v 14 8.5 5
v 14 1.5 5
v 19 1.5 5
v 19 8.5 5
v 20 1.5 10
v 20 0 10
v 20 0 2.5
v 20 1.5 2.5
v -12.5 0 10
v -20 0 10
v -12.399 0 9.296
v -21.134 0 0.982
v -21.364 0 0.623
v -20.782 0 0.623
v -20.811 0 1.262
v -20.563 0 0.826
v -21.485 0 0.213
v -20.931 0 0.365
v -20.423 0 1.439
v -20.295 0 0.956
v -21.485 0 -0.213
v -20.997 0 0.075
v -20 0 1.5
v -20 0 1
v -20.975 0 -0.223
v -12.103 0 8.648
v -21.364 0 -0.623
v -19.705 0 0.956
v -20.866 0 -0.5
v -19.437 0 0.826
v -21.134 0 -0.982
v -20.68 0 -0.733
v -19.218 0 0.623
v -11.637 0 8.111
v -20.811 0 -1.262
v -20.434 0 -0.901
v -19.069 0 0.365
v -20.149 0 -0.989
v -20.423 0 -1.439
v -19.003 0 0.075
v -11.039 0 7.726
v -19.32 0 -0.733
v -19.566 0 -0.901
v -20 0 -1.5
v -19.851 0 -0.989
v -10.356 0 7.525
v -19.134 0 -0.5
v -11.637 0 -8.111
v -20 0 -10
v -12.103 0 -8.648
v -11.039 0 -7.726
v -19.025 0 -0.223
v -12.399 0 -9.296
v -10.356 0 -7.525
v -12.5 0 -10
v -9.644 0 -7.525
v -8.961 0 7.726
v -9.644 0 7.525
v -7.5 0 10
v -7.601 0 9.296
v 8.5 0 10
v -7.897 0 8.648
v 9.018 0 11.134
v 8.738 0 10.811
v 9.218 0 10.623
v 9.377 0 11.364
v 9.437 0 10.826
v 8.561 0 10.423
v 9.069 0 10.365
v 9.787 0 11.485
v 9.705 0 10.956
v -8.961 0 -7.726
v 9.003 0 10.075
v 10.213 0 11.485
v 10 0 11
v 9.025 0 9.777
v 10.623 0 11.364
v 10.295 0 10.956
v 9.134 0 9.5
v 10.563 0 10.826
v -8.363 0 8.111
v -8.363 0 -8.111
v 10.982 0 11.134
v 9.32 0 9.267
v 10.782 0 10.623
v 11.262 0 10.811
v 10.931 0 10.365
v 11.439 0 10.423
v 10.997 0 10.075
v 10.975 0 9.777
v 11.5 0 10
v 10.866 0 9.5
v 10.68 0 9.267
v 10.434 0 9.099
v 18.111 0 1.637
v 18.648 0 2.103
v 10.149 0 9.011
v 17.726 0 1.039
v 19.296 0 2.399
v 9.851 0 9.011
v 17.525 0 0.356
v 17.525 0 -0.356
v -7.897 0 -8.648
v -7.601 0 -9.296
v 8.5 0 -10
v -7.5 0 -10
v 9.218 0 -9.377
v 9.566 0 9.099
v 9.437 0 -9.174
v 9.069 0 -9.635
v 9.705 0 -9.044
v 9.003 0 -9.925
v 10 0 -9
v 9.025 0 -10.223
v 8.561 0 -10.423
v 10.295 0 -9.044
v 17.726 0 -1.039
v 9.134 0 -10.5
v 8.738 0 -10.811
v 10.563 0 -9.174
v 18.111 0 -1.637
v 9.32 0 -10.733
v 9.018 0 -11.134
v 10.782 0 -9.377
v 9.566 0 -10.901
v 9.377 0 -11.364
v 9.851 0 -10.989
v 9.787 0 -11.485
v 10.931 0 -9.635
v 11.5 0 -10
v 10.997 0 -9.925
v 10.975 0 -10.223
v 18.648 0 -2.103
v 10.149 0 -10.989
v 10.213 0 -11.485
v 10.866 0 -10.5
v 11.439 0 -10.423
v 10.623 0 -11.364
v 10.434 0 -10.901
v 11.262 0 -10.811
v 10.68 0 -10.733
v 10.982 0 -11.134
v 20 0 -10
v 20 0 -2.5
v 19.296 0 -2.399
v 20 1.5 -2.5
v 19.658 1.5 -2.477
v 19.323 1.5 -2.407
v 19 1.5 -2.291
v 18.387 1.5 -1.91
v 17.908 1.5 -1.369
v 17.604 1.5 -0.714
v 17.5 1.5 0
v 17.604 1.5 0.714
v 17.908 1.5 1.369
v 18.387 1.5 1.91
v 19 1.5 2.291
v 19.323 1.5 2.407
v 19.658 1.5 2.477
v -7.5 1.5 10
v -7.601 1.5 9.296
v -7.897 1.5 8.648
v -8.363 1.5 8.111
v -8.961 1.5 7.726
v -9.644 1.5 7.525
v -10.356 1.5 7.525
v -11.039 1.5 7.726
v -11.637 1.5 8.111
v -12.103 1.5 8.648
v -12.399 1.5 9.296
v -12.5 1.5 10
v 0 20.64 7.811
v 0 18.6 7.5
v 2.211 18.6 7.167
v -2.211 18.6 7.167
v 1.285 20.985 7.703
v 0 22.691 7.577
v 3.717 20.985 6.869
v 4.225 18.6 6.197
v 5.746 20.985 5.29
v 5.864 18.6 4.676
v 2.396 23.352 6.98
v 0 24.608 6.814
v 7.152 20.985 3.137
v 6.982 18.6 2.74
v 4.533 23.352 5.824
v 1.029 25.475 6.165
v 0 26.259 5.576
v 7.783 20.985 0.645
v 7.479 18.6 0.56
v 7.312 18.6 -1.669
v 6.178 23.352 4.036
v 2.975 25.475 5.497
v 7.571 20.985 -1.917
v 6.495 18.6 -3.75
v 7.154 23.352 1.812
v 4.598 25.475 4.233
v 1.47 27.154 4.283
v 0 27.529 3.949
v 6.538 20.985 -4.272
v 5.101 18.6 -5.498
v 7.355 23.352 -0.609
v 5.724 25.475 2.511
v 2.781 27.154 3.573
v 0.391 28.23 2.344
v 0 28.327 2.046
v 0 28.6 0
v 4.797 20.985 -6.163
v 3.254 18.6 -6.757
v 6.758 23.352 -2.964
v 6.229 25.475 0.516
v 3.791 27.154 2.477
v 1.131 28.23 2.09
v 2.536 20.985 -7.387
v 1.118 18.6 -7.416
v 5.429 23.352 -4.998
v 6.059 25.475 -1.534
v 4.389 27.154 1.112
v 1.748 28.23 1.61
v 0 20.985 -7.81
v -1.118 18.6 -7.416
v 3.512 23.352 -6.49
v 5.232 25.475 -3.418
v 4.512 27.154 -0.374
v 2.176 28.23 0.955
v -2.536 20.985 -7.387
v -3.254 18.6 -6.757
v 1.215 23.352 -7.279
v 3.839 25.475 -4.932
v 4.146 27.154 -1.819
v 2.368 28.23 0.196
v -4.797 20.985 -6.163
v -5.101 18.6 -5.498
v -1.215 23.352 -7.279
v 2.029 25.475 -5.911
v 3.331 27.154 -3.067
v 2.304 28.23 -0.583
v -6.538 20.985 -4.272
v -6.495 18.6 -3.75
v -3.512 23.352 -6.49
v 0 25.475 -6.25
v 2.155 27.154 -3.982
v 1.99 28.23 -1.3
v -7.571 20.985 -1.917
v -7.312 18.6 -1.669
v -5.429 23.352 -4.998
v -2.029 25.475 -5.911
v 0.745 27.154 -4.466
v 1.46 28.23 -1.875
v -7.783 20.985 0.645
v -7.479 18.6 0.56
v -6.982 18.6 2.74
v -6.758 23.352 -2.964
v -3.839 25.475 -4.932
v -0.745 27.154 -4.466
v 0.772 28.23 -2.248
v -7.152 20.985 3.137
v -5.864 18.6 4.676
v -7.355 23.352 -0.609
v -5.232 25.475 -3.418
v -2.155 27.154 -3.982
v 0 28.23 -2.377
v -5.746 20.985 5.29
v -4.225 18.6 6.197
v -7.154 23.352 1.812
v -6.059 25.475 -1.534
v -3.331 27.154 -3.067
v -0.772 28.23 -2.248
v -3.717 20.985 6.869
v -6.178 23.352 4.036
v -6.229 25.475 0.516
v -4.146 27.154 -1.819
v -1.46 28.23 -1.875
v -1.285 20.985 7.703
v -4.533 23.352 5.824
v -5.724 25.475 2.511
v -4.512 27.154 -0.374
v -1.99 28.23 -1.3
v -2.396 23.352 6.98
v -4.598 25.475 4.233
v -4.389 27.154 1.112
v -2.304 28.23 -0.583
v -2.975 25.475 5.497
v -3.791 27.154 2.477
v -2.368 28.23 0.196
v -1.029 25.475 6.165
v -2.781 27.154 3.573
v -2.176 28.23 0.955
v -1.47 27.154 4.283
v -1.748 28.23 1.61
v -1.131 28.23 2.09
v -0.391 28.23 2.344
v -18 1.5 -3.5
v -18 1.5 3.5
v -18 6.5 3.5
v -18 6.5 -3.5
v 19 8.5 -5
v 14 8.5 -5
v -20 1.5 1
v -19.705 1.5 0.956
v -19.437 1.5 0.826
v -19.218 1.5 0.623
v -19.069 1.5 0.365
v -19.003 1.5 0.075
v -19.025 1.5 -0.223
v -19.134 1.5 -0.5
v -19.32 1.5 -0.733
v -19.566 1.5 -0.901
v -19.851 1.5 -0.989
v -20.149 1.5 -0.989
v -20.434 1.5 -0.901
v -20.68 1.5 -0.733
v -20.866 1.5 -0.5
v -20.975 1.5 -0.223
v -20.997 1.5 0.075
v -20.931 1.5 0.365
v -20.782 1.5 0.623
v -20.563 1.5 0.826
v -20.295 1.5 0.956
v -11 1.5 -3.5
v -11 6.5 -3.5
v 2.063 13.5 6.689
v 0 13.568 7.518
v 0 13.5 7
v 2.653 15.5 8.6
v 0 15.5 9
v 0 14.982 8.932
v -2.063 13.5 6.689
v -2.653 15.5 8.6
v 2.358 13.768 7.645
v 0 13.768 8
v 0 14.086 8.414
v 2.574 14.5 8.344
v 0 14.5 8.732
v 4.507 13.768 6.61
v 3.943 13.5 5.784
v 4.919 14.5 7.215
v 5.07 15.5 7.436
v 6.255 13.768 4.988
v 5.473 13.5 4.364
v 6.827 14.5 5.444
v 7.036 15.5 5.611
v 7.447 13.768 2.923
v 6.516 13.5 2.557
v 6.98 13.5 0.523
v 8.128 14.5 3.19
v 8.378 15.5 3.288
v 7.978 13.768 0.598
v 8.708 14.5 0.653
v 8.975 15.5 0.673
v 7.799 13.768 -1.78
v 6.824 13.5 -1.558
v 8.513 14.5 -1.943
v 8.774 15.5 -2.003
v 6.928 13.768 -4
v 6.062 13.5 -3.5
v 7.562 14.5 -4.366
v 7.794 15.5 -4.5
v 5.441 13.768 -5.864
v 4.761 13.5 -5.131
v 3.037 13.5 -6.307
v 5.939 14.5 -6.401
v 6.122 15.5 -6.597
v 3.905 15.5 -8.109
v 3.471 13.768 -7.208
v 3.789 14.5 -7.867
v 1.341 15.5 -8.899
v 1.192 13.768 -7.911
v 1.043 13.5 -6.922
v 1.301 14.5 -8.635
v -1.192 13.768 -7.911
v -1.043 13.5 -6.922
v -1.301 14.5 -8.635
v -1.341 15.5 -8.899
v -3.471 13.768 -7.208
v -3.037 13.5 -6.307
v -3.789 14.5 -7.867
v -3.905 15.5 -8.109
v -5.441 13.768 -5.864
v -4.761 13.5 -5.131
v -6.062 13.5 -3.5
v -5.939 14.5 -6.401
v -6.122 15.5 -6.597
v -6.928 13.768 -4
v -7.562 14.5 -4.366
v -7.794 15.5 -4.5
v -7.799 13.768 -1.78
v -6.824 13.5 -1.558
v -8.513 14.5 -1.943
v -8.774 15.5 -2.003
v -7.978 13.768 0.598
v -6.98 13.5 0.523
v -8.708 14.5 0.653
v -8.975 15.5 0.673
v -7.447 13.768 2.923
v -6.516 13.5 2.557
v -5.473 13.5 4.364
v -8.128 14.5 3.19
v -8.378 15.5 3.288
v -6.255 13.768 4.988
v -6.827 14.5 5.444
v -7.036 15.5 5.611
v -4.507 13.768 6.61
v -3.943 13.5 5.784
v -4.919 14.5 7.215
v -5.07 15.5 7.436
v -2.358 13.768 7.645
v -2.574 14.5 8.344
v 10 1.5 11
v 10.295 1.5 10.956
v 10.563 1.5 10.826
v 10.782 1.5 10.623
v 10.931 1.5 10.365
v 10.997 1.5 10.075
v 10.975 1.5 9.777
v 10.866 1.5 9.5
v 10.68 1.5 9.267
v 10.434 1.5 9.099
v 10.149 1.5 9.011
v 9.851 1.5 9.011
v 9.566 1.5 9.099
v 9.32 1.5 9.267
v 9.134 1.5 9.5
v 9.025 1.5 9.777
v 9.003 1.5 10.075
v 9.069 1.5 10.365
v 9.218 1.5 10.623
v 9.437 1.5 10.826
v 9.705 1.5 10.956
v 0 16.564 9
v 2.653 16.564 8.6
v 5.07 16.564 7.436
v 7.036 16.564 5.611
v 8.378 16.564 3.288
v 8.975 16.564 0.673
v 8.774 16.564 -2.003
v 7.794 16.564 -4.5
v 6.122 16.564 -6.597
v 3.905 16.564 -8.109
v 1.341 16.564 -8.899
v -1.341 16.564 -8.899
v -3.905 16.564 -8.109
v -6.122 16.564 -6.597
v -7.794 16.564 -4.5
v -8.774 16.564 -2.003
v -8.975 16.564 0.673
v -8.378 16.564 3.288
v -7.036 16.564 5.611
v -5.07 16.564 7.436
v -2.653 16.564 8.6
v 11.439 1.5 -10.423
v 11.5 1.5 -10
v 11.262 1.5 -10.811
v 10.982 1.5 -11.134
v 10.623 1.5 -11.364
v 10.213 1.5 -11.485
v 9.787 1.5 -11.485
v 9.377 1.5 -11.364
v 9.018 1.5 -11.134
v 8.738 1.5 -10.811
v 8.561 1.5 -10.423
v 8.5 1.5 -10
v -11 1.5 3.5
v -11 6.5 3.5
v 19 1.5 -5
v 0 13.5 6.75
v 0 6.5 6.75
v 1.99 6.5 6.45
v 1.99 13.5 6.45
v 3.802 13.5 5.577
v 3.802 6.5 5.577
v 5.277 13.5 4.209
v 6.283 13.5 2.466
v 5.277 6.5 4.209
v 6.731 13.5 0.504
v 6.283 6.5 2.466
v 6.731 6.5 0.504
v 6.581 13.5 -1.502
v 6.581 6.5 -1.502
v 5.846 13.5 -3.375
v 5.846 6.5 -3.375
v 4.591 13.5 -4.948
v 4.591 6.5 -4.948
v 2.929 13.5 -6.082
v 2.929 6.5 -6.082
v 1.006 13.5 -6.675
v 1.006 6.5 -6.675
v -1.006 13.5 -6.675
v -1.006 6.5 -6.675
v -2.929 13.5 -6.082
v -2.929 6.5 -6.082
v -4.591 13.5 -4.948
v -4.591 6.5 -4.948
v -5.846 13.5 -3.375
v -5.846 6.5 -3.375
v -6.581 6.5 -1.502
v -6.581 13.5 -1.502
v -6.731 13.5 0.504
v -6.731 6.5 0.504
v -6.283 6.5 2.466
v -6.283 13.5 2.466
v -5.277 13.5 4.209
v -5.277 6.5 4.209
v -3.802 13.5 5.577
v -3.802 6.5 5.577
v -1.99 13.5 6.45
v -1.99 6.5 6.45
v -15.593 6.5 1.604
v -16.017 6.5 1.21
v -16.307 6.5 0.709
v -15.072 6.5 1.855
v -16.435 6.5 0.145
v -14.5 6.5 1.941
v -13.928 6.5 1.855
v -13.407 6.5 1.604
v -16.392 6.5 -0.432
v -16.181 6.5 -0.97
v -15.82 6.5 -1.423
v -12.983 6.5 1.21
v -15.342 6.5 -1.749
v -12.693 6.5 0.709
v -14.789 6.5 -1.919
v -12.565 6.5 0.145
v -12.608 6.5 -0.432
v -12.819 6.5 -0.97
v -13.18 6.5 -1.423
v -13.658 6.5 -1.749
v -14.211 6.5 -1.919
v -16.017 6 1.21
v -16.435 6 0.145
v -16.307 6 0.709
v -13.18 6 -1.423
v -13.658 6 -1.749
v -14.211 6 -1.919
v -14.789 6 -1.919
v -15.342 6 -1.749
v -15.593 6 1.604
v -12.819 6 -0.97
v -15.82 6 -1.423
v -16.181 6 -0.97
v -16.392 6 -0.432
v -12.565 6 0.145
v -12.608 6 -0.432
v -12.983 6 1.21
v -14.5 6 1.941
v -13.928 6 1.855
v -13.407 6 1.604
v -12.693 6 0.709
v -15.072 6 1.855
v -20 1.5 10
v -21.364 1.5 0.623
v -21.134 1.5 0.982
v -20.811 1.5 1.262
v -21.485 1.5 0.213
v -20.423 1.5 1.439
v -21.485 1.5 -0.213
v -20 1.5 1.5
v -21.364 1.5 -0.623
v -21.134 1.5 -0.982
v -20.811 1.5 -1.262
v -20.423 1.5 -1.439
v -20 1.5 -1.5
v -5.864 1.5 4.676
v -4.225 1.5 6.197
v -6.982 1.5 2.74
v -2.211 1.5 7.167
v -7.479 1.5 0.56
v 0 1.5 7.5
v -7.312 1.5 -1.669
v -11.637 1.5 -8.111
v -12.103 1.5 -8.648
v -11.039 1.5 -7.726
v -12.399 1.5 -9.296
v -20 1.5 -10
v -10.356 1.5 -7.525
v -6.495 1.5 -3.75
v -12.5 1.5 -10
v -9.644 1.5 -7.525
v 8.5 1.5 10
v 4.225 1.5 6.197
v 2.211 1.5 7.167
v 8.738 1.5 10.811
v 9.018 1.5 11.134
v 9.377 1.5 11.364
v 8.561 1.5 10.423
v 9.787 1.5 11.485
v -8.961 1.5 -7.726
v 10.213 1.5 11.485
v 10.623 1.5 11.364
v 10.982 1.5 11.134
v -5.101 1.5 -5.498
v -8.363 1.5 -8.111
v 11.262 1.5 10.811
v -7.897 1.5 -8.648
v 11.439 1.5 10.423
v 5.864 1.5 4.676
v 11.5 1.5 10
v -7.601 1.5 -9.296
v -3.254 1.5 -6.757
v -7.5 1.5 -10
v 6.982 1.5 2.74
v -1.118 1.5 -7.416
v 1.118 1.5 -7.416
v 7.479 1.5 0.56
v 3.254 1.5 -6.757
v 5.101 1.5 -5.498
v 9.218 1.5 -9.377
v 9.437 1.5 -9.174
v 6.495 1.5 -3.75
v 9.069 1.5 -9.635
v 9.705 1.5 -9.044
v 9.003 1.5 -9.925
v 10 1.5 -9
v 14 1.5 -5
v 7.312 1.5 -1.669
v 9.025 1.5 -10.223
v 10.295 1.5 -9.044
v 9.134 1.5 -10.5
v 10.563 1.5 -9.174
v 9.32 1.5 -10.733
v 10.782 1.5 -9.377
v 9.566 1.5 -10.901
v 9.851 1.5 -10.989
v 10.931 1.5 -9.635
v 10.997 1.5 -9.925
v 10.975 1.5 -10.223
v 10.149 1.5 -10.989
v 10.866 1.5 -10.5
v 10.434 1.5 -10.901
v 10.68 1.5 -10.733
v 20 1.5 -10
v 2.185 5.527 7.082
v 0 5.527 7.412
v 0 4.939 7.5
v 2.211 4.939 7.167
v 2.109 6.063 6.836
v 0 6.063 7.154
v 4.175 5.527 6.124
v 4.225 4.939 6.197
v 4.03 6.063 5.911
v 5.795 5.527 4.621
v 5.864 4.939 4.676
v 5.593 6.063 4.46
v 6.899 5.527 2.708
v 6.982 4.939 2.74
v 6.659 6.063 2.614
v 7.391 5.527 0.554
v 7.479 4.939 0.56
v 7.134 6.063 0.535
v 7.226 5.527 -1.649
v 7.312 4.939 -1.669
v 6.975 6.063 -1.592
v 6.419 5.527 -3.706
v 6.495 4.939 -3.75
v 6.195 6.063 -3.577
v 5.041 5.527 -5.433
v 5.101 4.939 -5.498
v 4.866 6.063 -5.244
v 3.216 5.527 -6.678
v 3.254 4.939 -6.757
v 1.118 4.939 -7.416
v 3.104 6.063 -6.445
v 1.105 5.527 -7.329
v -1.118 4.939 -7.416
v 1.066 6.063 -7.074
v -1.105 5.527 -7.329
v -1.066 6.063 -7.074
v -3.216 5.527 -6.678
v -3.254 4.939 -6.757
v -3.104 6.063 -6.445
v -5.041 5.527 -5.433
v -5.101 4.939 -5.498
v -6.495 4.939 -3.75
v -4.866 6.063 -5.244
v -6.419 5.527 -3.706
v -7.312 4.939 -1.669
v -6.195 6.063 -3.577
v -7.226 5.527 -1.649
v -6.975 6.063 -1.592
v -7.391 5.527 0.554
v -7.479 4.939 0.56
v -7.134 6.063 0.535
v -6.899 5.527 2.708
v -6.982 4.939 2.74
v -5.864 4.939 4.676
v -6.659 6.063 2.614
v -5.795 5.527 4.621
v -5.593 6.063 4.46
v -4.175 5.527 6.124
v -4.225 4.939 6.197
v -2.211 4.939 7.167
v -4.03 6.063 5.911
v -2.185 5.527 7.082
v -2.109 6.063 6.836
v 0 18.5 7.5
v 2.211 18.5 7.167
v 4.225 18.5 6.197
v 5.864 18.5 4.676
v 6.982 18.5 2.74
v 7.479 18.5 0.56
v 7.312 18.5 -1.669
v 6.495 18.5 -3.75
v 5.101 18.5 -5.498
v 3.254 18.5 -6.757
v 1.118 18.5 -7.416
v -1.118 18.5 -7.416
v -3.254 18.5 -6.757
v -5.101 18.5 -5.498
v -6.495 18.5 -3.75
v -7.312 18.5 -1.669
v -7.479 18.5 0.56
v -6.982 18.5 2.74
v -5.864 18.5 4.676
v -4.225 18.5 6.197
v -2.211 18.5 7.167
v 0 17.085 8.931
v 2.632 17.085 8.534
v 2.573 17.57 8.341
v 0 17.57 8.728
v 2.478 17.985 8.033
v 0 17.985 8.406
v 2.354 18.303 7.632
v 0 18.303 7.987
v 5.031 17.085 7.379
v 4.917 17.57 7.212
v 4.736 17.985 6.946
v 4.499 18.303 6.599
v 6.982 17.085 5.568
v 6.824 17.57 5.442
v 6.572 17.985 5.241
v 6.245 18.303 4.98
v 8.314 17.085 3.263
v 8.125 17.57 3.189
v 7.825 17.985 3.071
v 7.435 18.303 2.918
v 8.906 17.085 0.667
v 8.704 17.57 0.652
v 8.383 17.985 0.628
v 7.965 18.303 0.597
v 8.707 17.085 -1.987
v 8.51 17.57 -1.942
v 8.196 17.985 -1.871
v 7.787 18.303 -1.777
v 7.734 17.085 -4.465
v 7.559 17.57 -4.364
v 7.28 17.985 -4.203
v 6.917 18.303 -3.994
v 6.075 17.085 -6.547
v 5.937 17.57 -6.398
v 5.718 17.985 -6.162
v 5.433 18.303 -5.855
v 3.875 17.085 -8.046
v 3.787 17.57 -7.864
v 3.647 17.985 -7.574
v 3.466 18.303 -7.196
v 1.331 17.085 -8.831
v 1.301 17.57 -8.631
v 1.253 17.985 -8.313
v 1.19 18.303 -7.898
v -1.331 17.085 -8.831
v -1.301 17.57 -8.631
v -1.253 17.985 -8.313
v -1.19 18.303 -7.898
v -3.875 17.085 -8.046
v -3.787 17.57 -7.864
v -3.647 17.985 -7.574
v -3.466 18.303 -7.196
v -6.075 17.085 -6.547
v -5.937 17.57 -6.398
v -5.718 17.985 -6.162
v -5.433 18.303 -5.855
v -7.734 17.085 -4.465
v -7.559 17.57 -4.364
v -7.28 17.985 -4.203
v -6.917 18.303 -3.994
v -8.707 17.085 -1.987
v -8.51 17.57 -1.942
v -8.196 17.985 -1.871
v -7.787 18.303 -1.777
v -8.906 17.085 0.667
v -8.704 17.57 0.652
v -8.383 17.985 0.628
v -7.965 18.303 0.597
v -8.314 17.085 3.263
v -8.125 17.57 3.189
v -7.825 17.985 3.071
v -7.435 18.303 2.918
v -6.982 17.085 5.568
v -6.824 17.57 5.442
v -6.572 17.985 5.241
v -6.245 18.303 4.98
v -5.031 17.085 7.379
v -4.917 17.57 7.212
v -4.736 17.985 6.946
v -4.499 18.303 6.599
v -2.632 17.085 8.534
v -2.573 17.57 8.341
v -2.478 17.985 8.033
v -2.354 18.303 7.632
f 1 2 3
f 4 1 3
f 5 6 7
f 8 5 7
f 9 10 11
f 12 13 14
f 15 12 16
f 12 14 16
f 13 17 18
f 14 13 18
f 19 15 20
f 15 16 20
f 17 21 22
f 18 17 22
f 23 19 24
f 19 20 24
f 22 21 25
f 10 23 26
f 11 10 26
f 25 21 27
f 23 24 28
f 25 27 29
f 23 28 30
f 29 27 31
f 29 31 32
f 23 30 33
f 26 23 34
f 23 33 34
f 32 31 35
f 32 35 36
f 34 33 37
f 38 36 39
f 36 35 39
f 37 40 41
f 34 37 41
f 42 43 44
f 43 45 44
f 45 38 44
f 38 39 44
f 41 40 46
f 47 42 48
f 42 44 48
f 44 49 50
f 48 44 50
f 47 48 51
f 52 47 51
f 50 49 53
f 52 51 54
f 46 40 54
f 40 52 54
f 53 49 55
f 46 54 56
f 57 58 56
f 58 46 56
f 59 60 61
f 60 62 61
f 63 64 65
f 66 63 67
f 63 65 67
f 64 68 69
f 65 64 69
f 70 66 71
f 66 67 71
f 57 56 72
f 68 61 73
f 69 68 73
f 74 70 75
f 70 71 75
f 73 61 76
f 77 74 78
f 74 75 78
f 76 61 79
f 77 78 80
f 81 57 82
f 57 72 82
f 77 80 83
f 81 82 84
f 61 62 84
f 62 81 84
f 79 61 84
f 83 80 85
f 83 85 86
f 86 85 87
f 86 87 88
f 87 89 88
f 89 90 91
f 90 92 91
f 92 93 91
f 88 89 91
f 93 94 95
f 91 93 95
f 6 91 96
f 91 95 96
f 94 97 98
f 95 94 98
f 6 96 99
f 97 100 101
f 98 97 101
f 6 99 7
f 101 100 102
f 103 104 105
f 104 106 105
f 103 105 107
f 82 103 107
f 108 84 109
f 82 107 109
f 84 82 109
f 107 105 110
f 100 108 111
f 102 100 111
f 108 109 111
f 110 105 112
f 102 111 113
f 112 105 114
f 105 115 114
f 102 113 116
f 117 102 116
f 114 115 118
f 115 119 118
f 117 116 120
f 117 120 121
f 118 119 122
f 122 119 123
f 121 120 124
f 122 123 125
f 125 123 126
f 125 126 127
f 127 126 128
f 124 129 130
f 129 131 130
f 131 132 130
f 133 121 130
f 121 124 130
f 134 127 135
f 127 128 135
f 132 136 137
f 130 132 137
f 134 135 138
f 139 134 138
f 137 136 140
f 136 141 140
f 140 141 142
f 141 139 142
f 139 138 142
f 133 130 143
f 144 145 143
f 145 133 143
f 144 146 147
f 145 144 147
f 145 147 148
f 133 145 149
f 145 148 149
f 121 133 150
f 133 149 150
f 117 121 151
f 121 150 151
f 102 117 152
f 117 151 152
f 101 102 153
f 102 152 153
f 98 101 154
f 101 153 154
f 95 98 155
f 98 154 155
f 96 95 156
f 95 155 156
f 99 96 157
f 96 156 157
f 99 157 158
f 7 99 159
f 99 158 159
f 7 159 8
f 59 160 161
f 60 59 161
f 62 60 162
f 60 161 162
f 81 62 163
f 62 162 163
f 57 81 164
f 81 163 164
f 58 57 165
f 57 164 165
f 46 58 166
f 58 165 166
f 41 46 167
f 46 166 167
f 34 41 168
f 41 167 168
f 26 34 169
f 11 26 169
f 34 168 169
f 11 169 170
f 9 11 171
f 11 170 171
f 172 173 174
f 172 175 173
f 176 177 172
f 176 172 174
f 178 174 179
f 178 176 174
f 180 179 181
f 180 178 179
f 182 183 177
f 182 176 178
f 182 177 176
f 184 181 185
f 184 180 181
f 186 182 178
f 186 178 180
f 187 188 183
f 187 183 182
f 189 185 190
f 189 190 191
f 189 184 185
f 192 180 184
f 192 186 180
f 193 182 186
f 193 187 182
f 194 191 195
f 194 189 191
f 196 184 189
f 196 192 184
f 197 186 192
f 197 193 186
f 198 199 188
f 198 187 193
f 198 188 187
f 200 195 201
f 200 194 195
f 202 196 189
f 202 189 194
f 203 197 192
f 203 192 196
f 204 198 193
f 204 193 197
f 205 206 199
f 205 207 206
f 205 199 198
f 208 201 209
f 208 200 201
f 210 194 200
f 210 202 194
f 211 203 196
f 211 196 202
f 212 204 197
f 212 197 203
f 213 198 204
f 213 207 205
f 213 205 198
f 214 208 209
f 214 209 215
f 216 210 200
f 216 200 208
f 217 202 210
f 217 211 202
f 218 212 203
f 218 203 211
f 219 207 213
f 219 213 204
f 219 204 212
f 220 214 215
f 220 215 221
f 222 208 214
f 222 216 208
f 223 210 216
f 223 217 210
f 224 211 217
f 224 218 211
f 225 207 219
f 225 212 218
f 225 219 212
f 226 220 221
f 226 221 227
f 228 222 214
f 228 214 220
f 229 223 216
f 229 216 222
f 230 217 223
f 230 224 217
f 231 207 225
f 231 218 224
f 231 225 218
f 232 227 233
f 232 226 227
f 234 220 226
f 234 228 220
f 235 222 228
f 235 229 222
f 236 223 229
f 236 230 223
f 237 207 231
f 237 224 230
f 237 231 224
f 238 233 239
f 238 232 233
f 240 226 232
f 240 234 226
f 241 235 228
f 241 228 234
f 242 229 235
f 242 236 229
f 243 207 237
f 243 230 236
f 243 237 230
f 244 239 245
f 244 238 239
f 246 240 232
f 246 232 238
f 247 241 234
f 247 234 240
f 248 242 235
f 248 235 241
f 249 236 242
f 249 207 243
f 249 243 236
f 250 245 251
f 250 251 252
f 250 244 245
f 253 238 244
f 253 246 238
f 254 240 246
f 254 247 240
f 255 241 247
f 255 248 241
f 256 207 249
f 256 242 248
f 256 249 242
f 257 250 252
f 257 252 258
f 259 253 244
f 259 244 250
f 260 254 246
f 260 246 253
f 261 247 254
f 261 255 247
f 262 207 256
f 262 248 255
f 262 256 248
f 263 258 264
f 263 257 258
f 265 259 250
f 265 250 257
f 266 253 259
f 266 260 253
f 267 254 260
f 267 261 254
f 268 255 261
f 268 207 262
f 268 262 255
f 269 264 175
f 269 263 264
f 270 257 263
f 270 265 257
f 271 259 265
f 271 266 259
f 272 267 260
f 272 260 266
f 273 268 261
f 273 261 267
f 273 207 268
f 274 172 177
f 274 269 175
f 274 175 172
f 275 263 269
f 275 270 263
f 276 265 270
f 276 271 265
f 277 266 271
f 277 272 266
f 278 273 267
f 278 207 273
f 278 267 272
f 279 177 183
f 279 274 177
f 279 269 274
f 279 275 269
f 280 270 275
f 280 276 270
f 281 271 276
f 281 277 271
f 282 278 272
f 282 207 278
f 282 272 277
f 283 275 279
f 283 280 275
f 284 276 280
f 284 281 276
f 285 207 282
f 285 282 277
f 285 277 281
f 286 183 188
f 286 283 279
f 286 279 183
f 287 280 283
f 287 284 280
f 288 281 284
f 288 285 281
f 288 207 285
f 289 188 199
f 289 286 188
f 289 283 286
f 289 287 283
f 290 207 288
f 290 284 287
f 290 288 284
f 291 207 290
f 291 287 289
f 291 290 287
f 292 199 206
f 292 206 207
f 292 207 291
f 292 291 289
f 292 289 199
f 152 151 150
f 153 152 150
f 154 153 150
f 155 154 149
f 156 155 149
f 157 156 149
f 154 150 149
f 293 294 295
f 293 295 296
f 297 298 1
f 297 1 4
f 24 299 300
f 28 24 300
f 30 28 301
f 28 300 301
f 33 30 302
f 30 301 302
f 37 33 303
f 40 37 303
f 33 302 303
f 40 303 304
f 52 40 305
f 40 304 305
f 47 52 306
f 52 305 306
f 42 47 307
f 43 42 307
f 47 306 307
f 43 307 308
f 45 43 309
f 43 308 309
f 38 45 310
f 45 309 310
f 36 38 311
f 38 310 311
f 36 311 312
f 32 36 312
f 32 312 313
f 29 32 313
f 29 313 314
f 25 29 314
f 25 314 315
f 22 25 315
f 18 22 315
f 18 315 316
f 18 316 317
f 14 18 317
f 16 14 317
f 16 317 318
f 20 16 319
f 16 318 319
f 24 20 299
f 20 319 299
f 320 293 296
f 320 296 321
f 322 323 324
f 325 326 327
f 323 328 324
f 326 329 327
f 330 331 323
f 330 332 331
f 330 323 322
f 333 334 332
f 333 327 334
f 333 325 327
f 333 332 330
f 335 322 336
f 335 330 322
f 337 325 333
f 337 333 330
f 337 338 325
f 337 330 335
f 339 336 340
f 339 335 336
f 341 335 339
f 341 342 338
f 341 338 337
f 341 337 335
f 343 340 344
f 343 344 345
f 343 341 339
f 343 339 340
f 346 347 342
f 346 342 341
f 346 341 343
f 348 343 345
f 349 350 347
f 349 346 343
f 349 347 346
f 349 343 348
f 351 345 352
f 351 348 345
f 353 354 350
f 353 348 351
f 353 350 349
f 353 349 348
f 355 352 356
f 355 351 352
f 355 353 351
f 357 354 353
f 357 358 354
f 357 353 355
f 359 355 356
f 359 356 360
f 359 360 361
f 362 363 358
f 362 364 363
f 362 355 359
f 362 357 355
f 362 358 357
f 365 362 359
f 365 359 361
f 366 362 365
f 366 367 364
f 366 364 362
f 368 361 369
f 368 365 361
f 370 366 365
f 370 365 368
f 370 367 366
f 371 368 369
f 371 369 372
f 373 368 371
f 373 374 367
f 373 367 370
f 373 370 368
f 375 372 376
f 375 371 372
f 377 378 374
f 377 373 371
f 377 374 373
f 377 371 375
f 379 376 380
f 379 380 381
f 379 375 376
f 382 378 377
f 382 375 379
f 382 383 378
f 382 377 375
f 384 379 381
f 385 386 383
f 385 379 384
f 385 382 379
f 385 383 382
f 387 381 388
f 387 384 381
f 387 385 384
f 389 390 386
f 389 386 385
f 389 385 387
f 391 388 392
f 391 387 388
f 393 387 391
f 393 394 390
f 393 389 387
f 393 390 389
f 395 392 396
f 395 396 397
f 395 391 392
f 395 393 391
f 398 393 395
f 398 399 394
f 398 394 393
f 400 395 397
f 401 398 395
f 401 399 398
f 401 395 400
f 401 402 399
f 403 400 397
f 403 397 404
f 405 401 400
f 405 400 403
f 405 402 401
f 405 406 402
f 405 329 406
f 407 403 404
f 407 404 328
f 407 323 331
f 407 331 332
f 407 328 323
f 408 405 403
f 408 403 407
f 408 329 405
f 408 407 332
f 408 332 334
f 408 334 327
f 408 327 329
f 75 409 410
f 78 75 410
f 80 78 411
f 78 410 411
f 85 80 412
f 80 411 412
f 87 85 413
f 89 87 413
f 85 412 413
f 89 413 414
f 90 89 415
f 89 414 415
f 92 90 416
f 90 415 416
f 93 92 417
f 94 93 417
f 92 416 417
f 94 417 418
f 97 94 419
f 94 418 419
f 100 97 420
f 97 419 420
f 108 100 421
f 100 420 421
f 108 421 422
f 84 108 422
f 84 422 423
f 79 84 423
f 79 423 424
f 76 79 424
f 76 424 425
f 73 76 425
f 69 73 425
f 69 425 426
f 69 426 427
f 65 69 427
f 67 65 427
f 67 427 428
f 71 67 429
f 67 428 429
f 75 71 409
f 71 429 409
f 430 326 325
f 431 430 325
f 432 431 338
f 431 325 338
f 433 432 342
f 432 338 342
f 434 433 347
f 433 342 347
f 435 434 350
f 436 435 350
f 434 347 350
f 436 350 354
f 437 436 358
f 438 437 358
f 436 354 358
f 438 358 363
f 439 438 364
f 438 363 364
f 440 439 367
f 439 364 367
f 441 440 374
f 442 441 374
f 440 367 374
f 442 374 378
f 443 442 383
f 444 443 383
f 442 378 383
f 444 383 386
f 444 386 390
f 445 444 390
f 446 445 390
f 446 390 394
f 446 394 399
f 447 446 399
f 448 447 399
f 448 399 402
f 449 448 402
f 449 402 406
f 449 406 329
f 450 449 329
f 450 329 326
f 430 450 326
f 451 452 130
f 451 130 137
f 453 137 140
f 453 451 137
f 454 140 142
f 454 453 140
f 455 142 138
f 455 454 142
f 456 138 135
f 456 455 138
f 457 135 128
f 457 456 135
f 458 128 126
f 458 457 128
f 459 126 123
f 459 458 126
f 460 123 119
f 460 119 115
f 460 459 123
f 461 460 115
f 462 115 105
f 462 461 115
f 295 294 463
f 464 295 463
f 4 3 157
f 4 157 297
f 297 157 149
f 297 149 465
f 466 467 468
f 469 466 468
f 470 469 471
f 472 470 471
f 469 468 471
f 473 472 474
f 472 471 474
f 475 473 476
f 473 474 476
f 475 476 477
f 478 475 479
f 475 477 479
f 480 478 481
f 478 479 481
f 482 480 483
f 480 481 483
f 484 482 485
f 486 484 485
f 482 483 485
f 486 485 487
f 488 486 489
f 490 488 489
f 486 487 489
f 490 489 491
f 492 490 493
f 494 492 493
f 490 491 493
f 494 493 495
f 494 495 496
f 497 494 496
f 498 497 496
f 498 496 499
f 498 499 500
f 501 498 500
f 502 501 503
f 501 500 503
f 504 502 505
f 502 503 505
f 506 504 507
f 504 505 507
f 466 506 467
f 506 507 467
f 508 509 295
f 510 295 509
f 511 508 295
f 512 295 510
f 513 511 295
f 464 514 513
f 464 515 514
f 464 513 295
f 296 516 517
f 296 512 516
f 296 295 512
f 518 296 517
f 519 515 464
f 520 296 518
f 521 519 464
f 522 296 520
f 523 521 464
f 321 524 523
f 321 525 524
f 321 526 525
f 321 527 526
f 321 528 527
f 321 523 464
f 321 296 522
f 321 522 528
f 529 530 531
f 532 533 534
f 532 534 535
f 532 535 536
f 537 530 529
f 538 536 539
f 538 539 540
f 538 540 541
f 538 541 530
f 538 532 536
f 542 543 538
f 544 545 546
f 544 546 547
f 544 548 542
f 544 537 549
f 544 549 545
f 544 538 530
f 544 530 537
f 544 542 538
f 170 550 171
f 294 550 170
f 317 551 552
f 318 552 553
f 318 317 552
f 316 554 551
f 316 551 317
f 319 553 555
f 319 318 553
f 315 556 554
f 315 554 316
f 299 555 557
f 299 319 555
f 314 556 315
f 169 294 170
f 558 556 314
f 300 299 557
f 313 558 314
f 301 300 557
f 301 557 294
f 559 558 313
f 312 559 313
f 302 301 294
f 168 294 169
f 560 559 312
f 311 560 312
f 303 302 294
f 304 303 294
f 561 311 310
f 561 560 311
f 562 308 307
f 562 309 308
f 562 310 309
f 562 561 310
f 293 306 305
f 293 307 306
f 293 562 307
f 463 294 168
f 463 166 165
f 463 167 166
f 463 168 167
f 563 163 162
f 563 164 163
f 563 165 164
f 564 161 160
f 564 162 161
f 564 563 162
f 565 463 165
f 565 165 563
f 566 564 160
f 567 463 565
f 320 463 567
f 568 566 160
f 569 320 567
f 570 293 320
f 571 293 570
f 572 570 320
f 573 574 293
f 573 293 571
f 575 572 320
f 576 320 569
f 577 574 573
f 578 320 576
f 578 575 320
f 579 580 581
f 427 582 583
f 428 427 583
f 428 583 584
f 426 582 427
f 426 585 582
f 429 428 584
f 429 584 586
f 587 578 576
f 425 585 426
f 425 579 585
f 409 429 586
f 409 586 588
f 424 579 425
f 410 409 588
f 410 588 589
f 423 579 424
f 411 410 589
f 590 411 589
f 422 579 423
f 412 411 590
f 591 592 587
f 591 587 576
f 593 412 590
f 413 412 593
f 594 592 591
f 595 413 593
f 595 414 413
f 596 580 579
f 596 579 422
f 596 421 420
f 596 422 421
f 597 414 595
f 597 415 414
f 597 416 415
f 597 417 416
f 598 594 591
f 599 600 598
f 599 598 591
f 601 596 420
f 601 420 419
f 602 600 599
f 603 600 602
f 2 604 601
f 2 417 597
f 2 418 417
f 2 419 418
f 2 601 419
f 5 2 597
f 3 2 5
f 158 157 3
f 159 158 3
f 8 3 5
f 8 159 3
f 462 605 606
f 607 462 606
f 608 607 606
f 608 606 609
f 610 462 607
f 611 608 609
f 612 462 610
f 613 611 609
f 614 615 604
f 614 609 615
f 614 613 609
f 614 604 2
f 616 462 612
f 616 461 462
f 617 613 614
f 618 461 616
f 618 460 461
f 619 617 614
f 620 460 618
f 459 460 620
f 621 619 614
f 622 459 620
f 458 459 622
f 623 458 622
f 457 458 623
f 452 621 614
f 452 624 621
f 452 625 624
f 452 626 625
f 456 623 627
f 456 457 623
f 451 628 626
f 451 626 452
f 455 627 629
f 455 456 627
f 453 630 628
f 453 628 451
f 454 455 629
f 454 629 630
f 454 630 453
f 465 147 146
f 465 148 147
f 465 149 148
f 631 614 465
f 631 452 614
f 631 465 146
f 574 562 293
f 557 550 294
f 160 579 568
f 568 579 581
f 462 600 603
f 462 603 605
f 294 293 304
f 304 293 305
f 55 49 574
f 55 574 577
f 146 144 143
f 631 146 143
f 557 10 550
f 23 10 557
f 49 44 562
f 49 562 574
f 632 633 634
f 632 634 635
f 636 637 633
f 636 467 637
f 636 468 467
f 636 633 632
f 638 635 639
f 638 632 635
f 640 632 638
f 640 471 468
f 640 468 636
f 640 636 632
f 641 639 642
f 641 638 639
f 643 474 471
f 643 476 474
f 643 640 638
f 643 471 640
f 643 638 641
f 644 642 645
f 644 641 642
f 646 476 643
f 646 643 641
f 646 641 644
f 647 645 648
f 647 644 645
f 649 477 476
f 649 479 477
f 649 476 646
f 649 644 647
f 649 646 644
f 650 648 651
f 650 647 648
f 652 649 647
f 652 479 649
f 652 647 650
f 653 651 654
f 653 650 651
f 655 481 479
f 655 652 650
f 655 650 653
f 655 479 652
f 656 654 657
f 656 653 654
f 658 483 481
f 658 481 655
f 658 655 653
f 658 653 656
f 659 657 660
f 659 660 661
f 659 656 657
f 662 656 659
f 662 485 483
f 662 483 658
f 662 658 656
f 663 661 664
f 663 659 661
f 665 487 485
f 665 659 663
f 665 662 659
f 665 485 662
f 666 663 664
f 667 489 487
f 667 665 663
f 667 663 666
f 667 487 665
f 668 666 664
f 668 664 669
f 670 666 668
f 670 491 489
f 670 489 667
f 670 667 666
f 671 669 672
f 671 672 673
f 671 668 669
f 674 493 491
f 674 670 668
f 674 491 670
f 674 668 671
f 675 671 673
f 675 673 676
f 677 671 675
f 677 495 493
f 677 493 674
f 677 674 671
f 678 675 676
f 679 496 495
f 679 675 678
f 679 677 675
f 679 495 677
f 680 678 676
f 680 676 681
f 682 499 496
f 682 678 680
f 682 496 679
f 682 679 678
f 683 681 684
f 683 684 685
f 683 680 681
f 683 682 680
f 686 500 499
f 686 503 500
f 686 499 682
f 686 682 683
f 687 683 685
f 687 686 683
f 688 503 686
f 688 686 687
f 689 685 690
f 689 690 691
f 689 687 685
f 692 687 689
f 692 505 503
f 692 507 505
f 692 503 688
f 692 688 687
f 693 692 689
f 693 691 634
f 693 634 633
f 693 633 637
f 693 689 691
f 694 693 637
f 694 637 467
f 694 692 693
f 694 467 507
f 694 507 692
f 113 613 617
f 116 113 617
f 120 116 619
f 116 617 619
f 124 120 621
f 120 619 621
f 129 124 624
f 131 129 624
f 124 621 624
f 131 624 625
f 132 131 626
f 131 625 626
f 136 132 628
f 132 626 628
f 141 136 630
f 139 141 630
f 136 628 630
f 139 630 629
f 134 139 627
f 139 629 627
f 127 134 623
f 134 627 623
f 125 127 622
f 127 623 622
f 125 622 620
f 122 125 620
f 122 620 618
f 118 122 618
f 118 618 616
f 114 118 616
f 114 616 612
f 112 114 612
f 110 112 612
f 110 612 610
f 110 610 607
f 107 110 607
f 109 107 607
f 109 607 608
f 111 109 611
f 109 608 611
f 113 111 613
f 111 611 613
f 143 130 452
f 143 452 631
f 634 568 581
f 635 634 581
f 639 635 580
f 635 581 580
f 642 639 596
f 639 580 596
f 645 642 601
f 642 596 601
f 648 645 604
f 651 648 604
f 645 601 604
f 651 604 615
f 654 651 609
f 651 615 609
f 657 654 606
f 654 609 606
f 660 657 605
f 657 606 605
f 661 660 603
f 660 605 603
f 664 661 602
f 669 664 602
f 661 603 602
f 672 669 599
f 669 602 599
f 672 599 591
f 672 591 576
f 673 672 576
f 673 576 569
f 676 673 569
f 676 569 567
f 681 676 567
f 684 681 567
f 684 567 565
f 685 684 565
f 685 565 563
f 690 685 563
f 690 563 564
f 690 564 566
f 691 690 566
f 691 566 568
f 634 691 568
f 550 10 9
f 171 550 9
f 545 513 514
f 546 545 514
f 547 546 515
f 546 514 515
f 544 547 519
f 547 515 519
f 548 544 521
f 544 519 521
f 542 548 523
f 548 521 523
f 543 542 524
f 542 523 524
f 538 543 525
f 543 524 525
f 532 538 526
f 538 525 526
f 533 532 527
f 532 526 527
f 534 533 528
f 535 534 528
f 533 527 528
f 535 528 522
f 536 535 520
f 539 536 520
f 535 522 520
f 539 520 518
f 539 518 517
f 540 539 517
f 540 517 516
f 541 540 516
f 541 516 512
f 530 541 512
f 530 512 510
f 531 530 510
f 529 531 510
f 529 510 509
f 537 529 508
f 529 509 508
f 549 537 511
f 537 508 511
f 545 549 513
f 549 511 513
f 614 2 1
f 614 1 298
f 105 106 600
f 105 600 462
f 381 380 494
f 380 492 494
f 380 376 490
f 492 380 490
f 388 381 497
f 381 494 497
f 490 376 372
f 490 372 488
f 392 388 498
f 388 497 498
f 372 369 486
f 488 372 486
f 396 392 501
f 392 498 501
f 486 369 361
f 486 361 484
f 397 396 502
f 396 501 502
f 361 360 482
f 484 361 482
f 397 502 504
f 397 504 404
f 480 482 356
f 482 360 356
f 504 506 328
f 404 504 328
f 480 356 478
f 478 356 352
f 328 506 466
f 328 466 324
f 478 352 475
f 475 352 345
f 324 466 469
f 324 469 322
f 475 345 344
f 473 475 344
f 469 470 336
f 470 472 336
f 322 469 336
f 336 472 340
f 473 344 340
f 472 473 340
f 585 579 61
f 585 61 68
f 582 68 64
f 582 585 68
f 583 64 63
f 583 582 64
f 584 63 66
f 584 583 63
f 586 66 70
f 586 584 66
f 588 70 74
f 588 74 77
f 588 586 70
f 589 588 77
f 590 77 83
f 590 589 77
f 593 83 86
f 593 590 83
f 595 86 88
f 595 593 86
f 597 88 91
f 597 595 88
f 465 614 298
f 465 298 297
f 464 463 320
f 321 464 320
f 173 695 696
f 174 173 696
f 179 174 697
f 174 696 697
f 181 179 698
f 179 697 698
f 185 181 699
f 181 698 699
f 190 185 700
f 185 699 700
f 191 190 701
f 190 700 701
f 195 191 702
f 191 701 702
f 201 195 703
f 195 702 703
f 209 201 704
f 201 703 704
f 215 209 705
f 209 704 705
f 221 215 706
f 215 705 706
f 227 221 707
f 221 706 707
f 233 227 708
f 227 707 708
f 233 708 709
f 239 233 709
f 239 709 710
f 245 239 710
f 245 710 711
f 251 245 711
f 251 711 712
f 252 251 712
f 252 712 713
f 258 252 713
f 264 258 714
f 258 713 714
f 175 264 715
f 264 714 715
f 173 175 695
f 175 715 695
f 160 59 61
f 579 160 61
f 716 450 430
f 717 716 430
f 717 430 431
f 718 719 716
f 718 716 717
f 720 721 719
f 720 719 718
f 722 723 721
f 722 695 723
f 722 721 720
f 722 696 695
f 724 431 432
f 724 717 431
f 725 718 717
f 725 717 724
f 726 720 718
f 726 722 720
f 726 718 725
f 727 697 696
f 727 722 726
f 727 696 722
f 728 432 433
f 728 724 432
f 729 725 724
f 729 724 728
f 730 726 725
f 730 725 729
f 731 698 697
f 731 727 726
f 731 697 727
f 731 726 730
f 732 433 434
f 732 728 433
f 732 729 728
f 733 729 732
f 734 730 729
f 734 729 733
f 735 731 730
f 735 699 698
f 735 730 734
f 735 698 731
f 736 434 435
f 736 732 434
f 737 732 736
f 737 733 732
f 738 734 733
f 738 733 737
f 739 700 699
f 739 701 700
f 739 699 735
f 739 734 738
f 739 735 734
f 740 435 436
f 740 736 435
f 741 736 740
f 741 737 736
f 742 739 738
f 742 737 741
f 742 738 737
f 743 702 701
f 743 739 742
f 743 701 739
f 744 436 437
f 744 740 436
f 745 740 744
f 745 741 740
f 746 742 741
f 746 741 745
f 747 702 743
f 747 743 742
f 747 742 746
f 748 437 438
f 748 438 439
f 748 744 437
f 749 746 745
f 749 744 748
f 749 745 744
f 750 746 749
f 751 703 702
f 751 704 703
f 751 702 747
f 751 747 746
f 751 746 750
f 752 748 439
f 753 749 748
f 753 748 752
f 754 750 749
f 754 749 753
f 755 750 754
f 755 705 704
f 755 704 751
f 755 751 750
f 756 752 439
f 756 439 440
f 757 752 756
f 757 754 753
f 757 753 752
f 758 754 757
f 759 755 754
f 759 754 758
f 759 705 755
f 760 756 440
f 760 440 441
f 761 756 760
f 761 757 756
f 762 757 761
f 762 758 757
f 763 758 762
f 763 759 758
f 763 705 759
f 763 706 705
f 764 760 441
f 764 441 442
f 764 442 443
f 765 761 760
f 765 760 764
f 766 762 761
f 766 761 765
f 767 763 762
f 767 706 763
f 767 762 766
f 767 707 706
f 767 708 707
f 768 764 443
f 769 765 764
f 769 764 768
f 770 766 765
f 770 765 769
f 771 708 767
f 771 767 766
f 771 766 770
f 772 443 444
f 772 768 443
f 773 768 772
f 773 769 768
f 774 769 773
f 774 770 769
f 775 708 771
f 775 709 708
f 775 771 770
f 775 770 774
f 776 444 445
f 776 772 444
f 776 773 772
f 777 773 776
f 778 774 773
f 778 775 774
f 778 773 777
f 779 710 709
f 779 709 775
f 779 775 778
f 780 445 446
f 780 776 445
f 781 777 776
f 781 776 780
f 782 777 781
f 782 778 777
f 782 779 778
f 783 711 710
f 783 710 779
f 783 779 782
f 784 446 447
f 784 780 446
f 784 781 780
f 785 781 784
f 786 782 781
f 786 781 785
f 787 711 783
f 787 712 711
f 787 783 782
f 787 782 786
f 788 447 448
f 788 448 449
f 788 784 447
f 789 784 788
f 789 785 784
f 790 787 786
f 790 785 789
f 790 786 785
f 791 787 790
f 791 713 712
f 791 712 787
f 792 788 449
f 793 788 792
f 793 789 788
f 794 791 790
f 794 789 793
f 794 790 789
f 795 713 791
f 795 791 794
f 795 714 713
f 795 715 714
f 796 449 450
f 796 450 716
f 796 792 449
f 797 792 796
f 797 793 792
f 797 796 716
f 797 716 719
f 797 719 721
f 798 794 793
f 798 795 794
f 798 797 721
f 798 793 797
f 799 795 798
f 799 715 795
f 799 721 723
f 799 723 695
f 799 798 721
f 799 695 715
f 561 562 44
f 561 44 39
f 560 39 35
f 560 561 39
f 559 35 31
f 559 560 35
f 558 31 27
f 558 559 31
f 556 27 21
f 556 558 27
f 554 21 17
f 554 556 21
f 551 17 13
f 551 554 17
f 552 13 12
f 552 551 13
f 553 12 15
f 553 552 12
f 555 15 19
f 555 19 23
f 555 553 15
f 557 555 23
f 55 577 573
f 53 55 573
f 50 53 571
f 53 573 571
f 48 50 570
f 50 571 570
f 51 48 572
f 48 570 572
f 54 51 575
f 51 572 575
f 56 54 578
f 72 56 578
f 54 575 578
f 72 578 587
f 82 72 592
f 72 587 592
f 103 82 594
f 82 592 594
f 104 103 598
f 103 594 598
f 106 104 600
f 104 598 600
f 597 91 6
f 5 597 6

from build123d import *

# Parameters (mm, degrees)
SKETCH1_W           = 40
SKETCH1_H           = 20
BOSS_EXTRUDE1_DEPTH = 1.5
SKETCH2_R           = 1.5
BOSS_EXTRUDE2_DEPTH = 1.5
SKETCH3_R           = 1
SKETCH3_R_2         = 2.5
CUT_EXTRUDE1_DEPTH  = 1.5
SKETCH4_W           = 7
SKETCH4_H           = 7
BOSS_EXTRUDE3_DEPTH = 5
SKETCH5_R           = 1.940753899
CUT_EXTRUDE2_DEPTH  = 0.5
SKETCH6_W           = 5
SKETCH6_H           = 10
BOSS_EXTRUDE4_DEPTH = 7
SKETCH7_R           = 7.5
BOSS_EXTRUDE5_DEPTH = 5
SKETCH8_R           = 6.75
BOSS_EXTRUDE6_DEPTH = 7
SKETCH9_R           = 9
BOSS_EXTRUDE7_DEPTH = 5
SKETCH11_R          = 7.5
BOSS_EXTRUDE8_DEPTH = 0.1
DOME1_FACE_RADIUS   = 7.5
DOME1_HEIGHT        = 10
FILLET2_R           = 2
FILLET4_R           = 2


with BuildPart() as part:
    # Sketch1 → Boss-Extrude1 (new body)
    with BuildSketch(Plane(origin=(0, 0, 0), x_dir=(1, 0, 0), z_dir=(0, 1, 0))):
        Rectangle(SKETCH1_W, SKETCH1_H)
    extrude(amount=BOSS_EXTRUDE1_DEPTH)

    # Sketch2 → Boss-Extrude2 (add)
    with BuildSketch(Plane(origin=(0, 1.5, 0), x_dir=(1, 0, 0), z_dir=(0, 1, 0))):
        with Locations((-20, 0)):
            Circle(SKETCH2_R)
        with Locations((10, 10)):
            Circle(SKETCH2_R)
        with Locations((10, -10)):
            Circle(SKETCH2_R)
    extrude(amount=-BOSS_EXTRUDE2_DEPTH)

    # Sketch3 → Cut-Extrude1 (cut)
    with BuildSketch(Plane(origin=(0, 1.5, 0), x_dir=(1, 0, 0), z_dir=(0, 1, 0))):
        with Locations(Location((-20, 0, 0), (0, 0, 270))):
            Circle(SKETCH3_R)
        with Locations(Location((10, -10, 0), (0, 0, 270))):
            Circle(SKETCH3_R)
        with Locations(Location((10, 10, 0), (0, 0, 270))):
            Circle(SKETCH3_R)
        with Locations((-10, -10)):
            Circle(SKETCH3_R_2)
        with Locations((-10, 10)):
            Circle(SKETCH3_R_2)
        with Locations((20, 0)):
            Circle(SKETCH3_R_2)
    extrude(amount=-CUT_EXTRUDE1_DEPTH, mode=Mode.SUBTRACT)

    # Sketch4 → Boss-Extrude3 (add)
    with BuildSketch(Plane(origin=(0, 1.5, 0), x_dir=(1, 0, 0), z_dir=(0, 1, 0))):
        with Locations((-14.5, 0)):
            Rectangle(SKETCH4_W, SKETCH4_H)
    extrude(amount=BOSS_EXTRUDE3_DEPTH)

    # Sketch5 → Cut-Extrude2 (cut)
    with BuildSketch(Plane(origin=(0, 6.5, 0), x_dir=(1, 0, 0), z_dir=(0, 1, 0))):
        with Locations(Location((-14.5, 0, 0), (0, 0, 270))):
            Circle(SKETCH5_R)
    extrude(amount=-CUT_EXTRUDE2_DEPTH, mode=Mode.SUBTRACT)

    # Sketch6 → Boss-Extrude4 (add)
    with BuildSketch(Plane(origin=(0, 1.5, 0), x_dir=(1, 0, 0), z_dir=(0, 1, 0))):
        with Locations((16.5, 0)):
            Rectangle(SKETCH6_W, SKETCH6_H)
    extrude(amount=BOSS_EXTRUDE4_DEPTH)

    # Sketch7 → Boss-Extrude5 (add)
    with BuildSketch(Plane(origin=(0, 1.5, 0), x_dir=(1, 0, 0), z_dir=(0, 1, 0))):
        with Locations(Location((0, 0, 0), (0, 0, 270))):
            Circle(SKETCH7_R)
    extrude(amount=BOSS_EXTRUDE5_DEPTH)

    # Sketch8 → Boss-Extrude6 (add)
    with BuildSketch(Plane(origin=(0, 6.5, 0), x_dir=(1, 0, 0), z_dir=(0, 1, 0))):
        with Locations(Location((0, 0, 0), (0, 0, 270))):
            Circle(SKETCH8_R)
    extrude(amount=BOSS_EXTRUDE6_DEPTH)

    # Sketch9 → Boss-Extrude7 (add)
    with BuildSketch(Plane(origin=(0, 13.5, 0), x_dir=(1, 0, 0), z_dir=(0, 1, 0))):
        with Locations(Location((0, 0, 0), (0, 0, 270))):
            Circle(SKETCH9_R)
    extrude(amount=BOSS_EXTRUDE7_DEPTH)

    # Sketch11 → Boss-Extrude8 (add)
    with BuildSketch(Plane(origin=(0, 18.5, 0), x_dir=(1, 0, 0), z_dir=(0, 1, 0))):
        with Locations(Location((0, 0, 0), (0, 0, 270))):
            Circle(SKETCH11_R)
    extrude(amount=BOSS_EXTRUDE8_DEPTH)

    # Dome1: a dome of height H over a round flat face of radius A is a cap of a sphere of radius (A * A + H * H) / (2 * H)
    dome1_r = (DOME1_FACE_RADIUS * DOME1_FACE_RADIUS + DOME1_HEIGHT * DOME1_HEIGHT) / (2 * DOME1_HEIGHT)
    dome1_base = Plane((0, 18.6, 0), z_dir=(0, 1, 0))
    with Locations(dome1_base.offset(DOME1_HEIGHT - dome1_r)):
        dome1_ball = Sphere(dome1_r, mode=Mode.PRIVATE)
    add(split(dome1_ball, bisect_by=dome1_base, keep=Keep.TOP, mode=Mode.PRIVATE))

    # Fillet2
    # the kernel refuses this fillet: 2 mm, written as the material it takes off along each edge
    with BuildSketch(Plane(origin=(0, 13.5, 0), x_dir=(0, 0, 1), z_dir=(-1, 0, 0))) as fillet2_piece_1:
        with BuildLine():
            CenterArc((9 - FILLET2_R, FILLET2_R), FILLET2_R, 270, 90)
            Line((9 - FILLET2_R, 0), (9 - FILLET2_R, -FILLET2_R * 0.02))
            Line((9 - FILLET2_R, -FILLET2_R * 0.02), (9 + FILLET2_R * 0.02, -FILLET2_R * 0.02))
            Line((9 + FILLET2_R * 0.02, -FILLET2_R * 0.02), (9 + FILLET2_R * 0.02, FILLET2_R))
            Line((9 + FILLET2_R * 0.02, FILLET2_R), (9, FILLET2_R))
        make_face()
    revolve(axis=Axis((0, 13.5, 0), (0, 1, 0)), mode=Mode.SUBTRACT)
    with BuildSketch(Plane(origin=(0, 18.5, 0), x_dir=(0, 0, 1), z_dir=(-1, 0, 0))) as fillet2_piece_2:
        with BuildLine():
            CenterArc((7, -1.936491673), FILLET2_R, 0, 75.522487814)
            Line((7.5, 0), (7.51, 0.038729833))
            ThreePointArc((7.51, 0.038729833), (8.25, 0.04), (9, 0.04))
            Line((9, 0.04), (9.04, 0))
            Line((9.04, 0), (9.04, -1.936491673))
            Line((9.04, -1.936491673), (9, -1.936491673))
        make_face()
    revolve(axis=Axis((0, 18.5, 0), (0, 1, 0)), mode=Mode.SUBTRACT)

    # Fillet4
    # the kernel refuses this fillet: 2 mm, written as the material it takes off along each edge
    with BuildSketch(Plane(origin=(0, 6.5, 0), x_dir=(0, 0, 1), z_dir=(-1, 0, 0))) as fillet4_piece_1:
        with BuildLine():
            CenterArc((5.5, -1.5612495), FILLET4_R, 0, 51.317812547)
            Line((7.5, -1.5612495), (7.54, -1.5612495))
            Line((7.54, -1.5612495), (7.54, 0))
            Line((7.54, 0), (7.5, 0.04))
            ThreePointArc((7.5, 0.04), (7.125, 0.04), (6.775, 0.03122499))
            Line((6.775, 0.03122499), (6.75, 0))
        make_face()
    revolve(axis=Axis((0, 6.5, 0), (0, 1, 0)), mode=Mode.SUBTRACT)


solid = part.part
